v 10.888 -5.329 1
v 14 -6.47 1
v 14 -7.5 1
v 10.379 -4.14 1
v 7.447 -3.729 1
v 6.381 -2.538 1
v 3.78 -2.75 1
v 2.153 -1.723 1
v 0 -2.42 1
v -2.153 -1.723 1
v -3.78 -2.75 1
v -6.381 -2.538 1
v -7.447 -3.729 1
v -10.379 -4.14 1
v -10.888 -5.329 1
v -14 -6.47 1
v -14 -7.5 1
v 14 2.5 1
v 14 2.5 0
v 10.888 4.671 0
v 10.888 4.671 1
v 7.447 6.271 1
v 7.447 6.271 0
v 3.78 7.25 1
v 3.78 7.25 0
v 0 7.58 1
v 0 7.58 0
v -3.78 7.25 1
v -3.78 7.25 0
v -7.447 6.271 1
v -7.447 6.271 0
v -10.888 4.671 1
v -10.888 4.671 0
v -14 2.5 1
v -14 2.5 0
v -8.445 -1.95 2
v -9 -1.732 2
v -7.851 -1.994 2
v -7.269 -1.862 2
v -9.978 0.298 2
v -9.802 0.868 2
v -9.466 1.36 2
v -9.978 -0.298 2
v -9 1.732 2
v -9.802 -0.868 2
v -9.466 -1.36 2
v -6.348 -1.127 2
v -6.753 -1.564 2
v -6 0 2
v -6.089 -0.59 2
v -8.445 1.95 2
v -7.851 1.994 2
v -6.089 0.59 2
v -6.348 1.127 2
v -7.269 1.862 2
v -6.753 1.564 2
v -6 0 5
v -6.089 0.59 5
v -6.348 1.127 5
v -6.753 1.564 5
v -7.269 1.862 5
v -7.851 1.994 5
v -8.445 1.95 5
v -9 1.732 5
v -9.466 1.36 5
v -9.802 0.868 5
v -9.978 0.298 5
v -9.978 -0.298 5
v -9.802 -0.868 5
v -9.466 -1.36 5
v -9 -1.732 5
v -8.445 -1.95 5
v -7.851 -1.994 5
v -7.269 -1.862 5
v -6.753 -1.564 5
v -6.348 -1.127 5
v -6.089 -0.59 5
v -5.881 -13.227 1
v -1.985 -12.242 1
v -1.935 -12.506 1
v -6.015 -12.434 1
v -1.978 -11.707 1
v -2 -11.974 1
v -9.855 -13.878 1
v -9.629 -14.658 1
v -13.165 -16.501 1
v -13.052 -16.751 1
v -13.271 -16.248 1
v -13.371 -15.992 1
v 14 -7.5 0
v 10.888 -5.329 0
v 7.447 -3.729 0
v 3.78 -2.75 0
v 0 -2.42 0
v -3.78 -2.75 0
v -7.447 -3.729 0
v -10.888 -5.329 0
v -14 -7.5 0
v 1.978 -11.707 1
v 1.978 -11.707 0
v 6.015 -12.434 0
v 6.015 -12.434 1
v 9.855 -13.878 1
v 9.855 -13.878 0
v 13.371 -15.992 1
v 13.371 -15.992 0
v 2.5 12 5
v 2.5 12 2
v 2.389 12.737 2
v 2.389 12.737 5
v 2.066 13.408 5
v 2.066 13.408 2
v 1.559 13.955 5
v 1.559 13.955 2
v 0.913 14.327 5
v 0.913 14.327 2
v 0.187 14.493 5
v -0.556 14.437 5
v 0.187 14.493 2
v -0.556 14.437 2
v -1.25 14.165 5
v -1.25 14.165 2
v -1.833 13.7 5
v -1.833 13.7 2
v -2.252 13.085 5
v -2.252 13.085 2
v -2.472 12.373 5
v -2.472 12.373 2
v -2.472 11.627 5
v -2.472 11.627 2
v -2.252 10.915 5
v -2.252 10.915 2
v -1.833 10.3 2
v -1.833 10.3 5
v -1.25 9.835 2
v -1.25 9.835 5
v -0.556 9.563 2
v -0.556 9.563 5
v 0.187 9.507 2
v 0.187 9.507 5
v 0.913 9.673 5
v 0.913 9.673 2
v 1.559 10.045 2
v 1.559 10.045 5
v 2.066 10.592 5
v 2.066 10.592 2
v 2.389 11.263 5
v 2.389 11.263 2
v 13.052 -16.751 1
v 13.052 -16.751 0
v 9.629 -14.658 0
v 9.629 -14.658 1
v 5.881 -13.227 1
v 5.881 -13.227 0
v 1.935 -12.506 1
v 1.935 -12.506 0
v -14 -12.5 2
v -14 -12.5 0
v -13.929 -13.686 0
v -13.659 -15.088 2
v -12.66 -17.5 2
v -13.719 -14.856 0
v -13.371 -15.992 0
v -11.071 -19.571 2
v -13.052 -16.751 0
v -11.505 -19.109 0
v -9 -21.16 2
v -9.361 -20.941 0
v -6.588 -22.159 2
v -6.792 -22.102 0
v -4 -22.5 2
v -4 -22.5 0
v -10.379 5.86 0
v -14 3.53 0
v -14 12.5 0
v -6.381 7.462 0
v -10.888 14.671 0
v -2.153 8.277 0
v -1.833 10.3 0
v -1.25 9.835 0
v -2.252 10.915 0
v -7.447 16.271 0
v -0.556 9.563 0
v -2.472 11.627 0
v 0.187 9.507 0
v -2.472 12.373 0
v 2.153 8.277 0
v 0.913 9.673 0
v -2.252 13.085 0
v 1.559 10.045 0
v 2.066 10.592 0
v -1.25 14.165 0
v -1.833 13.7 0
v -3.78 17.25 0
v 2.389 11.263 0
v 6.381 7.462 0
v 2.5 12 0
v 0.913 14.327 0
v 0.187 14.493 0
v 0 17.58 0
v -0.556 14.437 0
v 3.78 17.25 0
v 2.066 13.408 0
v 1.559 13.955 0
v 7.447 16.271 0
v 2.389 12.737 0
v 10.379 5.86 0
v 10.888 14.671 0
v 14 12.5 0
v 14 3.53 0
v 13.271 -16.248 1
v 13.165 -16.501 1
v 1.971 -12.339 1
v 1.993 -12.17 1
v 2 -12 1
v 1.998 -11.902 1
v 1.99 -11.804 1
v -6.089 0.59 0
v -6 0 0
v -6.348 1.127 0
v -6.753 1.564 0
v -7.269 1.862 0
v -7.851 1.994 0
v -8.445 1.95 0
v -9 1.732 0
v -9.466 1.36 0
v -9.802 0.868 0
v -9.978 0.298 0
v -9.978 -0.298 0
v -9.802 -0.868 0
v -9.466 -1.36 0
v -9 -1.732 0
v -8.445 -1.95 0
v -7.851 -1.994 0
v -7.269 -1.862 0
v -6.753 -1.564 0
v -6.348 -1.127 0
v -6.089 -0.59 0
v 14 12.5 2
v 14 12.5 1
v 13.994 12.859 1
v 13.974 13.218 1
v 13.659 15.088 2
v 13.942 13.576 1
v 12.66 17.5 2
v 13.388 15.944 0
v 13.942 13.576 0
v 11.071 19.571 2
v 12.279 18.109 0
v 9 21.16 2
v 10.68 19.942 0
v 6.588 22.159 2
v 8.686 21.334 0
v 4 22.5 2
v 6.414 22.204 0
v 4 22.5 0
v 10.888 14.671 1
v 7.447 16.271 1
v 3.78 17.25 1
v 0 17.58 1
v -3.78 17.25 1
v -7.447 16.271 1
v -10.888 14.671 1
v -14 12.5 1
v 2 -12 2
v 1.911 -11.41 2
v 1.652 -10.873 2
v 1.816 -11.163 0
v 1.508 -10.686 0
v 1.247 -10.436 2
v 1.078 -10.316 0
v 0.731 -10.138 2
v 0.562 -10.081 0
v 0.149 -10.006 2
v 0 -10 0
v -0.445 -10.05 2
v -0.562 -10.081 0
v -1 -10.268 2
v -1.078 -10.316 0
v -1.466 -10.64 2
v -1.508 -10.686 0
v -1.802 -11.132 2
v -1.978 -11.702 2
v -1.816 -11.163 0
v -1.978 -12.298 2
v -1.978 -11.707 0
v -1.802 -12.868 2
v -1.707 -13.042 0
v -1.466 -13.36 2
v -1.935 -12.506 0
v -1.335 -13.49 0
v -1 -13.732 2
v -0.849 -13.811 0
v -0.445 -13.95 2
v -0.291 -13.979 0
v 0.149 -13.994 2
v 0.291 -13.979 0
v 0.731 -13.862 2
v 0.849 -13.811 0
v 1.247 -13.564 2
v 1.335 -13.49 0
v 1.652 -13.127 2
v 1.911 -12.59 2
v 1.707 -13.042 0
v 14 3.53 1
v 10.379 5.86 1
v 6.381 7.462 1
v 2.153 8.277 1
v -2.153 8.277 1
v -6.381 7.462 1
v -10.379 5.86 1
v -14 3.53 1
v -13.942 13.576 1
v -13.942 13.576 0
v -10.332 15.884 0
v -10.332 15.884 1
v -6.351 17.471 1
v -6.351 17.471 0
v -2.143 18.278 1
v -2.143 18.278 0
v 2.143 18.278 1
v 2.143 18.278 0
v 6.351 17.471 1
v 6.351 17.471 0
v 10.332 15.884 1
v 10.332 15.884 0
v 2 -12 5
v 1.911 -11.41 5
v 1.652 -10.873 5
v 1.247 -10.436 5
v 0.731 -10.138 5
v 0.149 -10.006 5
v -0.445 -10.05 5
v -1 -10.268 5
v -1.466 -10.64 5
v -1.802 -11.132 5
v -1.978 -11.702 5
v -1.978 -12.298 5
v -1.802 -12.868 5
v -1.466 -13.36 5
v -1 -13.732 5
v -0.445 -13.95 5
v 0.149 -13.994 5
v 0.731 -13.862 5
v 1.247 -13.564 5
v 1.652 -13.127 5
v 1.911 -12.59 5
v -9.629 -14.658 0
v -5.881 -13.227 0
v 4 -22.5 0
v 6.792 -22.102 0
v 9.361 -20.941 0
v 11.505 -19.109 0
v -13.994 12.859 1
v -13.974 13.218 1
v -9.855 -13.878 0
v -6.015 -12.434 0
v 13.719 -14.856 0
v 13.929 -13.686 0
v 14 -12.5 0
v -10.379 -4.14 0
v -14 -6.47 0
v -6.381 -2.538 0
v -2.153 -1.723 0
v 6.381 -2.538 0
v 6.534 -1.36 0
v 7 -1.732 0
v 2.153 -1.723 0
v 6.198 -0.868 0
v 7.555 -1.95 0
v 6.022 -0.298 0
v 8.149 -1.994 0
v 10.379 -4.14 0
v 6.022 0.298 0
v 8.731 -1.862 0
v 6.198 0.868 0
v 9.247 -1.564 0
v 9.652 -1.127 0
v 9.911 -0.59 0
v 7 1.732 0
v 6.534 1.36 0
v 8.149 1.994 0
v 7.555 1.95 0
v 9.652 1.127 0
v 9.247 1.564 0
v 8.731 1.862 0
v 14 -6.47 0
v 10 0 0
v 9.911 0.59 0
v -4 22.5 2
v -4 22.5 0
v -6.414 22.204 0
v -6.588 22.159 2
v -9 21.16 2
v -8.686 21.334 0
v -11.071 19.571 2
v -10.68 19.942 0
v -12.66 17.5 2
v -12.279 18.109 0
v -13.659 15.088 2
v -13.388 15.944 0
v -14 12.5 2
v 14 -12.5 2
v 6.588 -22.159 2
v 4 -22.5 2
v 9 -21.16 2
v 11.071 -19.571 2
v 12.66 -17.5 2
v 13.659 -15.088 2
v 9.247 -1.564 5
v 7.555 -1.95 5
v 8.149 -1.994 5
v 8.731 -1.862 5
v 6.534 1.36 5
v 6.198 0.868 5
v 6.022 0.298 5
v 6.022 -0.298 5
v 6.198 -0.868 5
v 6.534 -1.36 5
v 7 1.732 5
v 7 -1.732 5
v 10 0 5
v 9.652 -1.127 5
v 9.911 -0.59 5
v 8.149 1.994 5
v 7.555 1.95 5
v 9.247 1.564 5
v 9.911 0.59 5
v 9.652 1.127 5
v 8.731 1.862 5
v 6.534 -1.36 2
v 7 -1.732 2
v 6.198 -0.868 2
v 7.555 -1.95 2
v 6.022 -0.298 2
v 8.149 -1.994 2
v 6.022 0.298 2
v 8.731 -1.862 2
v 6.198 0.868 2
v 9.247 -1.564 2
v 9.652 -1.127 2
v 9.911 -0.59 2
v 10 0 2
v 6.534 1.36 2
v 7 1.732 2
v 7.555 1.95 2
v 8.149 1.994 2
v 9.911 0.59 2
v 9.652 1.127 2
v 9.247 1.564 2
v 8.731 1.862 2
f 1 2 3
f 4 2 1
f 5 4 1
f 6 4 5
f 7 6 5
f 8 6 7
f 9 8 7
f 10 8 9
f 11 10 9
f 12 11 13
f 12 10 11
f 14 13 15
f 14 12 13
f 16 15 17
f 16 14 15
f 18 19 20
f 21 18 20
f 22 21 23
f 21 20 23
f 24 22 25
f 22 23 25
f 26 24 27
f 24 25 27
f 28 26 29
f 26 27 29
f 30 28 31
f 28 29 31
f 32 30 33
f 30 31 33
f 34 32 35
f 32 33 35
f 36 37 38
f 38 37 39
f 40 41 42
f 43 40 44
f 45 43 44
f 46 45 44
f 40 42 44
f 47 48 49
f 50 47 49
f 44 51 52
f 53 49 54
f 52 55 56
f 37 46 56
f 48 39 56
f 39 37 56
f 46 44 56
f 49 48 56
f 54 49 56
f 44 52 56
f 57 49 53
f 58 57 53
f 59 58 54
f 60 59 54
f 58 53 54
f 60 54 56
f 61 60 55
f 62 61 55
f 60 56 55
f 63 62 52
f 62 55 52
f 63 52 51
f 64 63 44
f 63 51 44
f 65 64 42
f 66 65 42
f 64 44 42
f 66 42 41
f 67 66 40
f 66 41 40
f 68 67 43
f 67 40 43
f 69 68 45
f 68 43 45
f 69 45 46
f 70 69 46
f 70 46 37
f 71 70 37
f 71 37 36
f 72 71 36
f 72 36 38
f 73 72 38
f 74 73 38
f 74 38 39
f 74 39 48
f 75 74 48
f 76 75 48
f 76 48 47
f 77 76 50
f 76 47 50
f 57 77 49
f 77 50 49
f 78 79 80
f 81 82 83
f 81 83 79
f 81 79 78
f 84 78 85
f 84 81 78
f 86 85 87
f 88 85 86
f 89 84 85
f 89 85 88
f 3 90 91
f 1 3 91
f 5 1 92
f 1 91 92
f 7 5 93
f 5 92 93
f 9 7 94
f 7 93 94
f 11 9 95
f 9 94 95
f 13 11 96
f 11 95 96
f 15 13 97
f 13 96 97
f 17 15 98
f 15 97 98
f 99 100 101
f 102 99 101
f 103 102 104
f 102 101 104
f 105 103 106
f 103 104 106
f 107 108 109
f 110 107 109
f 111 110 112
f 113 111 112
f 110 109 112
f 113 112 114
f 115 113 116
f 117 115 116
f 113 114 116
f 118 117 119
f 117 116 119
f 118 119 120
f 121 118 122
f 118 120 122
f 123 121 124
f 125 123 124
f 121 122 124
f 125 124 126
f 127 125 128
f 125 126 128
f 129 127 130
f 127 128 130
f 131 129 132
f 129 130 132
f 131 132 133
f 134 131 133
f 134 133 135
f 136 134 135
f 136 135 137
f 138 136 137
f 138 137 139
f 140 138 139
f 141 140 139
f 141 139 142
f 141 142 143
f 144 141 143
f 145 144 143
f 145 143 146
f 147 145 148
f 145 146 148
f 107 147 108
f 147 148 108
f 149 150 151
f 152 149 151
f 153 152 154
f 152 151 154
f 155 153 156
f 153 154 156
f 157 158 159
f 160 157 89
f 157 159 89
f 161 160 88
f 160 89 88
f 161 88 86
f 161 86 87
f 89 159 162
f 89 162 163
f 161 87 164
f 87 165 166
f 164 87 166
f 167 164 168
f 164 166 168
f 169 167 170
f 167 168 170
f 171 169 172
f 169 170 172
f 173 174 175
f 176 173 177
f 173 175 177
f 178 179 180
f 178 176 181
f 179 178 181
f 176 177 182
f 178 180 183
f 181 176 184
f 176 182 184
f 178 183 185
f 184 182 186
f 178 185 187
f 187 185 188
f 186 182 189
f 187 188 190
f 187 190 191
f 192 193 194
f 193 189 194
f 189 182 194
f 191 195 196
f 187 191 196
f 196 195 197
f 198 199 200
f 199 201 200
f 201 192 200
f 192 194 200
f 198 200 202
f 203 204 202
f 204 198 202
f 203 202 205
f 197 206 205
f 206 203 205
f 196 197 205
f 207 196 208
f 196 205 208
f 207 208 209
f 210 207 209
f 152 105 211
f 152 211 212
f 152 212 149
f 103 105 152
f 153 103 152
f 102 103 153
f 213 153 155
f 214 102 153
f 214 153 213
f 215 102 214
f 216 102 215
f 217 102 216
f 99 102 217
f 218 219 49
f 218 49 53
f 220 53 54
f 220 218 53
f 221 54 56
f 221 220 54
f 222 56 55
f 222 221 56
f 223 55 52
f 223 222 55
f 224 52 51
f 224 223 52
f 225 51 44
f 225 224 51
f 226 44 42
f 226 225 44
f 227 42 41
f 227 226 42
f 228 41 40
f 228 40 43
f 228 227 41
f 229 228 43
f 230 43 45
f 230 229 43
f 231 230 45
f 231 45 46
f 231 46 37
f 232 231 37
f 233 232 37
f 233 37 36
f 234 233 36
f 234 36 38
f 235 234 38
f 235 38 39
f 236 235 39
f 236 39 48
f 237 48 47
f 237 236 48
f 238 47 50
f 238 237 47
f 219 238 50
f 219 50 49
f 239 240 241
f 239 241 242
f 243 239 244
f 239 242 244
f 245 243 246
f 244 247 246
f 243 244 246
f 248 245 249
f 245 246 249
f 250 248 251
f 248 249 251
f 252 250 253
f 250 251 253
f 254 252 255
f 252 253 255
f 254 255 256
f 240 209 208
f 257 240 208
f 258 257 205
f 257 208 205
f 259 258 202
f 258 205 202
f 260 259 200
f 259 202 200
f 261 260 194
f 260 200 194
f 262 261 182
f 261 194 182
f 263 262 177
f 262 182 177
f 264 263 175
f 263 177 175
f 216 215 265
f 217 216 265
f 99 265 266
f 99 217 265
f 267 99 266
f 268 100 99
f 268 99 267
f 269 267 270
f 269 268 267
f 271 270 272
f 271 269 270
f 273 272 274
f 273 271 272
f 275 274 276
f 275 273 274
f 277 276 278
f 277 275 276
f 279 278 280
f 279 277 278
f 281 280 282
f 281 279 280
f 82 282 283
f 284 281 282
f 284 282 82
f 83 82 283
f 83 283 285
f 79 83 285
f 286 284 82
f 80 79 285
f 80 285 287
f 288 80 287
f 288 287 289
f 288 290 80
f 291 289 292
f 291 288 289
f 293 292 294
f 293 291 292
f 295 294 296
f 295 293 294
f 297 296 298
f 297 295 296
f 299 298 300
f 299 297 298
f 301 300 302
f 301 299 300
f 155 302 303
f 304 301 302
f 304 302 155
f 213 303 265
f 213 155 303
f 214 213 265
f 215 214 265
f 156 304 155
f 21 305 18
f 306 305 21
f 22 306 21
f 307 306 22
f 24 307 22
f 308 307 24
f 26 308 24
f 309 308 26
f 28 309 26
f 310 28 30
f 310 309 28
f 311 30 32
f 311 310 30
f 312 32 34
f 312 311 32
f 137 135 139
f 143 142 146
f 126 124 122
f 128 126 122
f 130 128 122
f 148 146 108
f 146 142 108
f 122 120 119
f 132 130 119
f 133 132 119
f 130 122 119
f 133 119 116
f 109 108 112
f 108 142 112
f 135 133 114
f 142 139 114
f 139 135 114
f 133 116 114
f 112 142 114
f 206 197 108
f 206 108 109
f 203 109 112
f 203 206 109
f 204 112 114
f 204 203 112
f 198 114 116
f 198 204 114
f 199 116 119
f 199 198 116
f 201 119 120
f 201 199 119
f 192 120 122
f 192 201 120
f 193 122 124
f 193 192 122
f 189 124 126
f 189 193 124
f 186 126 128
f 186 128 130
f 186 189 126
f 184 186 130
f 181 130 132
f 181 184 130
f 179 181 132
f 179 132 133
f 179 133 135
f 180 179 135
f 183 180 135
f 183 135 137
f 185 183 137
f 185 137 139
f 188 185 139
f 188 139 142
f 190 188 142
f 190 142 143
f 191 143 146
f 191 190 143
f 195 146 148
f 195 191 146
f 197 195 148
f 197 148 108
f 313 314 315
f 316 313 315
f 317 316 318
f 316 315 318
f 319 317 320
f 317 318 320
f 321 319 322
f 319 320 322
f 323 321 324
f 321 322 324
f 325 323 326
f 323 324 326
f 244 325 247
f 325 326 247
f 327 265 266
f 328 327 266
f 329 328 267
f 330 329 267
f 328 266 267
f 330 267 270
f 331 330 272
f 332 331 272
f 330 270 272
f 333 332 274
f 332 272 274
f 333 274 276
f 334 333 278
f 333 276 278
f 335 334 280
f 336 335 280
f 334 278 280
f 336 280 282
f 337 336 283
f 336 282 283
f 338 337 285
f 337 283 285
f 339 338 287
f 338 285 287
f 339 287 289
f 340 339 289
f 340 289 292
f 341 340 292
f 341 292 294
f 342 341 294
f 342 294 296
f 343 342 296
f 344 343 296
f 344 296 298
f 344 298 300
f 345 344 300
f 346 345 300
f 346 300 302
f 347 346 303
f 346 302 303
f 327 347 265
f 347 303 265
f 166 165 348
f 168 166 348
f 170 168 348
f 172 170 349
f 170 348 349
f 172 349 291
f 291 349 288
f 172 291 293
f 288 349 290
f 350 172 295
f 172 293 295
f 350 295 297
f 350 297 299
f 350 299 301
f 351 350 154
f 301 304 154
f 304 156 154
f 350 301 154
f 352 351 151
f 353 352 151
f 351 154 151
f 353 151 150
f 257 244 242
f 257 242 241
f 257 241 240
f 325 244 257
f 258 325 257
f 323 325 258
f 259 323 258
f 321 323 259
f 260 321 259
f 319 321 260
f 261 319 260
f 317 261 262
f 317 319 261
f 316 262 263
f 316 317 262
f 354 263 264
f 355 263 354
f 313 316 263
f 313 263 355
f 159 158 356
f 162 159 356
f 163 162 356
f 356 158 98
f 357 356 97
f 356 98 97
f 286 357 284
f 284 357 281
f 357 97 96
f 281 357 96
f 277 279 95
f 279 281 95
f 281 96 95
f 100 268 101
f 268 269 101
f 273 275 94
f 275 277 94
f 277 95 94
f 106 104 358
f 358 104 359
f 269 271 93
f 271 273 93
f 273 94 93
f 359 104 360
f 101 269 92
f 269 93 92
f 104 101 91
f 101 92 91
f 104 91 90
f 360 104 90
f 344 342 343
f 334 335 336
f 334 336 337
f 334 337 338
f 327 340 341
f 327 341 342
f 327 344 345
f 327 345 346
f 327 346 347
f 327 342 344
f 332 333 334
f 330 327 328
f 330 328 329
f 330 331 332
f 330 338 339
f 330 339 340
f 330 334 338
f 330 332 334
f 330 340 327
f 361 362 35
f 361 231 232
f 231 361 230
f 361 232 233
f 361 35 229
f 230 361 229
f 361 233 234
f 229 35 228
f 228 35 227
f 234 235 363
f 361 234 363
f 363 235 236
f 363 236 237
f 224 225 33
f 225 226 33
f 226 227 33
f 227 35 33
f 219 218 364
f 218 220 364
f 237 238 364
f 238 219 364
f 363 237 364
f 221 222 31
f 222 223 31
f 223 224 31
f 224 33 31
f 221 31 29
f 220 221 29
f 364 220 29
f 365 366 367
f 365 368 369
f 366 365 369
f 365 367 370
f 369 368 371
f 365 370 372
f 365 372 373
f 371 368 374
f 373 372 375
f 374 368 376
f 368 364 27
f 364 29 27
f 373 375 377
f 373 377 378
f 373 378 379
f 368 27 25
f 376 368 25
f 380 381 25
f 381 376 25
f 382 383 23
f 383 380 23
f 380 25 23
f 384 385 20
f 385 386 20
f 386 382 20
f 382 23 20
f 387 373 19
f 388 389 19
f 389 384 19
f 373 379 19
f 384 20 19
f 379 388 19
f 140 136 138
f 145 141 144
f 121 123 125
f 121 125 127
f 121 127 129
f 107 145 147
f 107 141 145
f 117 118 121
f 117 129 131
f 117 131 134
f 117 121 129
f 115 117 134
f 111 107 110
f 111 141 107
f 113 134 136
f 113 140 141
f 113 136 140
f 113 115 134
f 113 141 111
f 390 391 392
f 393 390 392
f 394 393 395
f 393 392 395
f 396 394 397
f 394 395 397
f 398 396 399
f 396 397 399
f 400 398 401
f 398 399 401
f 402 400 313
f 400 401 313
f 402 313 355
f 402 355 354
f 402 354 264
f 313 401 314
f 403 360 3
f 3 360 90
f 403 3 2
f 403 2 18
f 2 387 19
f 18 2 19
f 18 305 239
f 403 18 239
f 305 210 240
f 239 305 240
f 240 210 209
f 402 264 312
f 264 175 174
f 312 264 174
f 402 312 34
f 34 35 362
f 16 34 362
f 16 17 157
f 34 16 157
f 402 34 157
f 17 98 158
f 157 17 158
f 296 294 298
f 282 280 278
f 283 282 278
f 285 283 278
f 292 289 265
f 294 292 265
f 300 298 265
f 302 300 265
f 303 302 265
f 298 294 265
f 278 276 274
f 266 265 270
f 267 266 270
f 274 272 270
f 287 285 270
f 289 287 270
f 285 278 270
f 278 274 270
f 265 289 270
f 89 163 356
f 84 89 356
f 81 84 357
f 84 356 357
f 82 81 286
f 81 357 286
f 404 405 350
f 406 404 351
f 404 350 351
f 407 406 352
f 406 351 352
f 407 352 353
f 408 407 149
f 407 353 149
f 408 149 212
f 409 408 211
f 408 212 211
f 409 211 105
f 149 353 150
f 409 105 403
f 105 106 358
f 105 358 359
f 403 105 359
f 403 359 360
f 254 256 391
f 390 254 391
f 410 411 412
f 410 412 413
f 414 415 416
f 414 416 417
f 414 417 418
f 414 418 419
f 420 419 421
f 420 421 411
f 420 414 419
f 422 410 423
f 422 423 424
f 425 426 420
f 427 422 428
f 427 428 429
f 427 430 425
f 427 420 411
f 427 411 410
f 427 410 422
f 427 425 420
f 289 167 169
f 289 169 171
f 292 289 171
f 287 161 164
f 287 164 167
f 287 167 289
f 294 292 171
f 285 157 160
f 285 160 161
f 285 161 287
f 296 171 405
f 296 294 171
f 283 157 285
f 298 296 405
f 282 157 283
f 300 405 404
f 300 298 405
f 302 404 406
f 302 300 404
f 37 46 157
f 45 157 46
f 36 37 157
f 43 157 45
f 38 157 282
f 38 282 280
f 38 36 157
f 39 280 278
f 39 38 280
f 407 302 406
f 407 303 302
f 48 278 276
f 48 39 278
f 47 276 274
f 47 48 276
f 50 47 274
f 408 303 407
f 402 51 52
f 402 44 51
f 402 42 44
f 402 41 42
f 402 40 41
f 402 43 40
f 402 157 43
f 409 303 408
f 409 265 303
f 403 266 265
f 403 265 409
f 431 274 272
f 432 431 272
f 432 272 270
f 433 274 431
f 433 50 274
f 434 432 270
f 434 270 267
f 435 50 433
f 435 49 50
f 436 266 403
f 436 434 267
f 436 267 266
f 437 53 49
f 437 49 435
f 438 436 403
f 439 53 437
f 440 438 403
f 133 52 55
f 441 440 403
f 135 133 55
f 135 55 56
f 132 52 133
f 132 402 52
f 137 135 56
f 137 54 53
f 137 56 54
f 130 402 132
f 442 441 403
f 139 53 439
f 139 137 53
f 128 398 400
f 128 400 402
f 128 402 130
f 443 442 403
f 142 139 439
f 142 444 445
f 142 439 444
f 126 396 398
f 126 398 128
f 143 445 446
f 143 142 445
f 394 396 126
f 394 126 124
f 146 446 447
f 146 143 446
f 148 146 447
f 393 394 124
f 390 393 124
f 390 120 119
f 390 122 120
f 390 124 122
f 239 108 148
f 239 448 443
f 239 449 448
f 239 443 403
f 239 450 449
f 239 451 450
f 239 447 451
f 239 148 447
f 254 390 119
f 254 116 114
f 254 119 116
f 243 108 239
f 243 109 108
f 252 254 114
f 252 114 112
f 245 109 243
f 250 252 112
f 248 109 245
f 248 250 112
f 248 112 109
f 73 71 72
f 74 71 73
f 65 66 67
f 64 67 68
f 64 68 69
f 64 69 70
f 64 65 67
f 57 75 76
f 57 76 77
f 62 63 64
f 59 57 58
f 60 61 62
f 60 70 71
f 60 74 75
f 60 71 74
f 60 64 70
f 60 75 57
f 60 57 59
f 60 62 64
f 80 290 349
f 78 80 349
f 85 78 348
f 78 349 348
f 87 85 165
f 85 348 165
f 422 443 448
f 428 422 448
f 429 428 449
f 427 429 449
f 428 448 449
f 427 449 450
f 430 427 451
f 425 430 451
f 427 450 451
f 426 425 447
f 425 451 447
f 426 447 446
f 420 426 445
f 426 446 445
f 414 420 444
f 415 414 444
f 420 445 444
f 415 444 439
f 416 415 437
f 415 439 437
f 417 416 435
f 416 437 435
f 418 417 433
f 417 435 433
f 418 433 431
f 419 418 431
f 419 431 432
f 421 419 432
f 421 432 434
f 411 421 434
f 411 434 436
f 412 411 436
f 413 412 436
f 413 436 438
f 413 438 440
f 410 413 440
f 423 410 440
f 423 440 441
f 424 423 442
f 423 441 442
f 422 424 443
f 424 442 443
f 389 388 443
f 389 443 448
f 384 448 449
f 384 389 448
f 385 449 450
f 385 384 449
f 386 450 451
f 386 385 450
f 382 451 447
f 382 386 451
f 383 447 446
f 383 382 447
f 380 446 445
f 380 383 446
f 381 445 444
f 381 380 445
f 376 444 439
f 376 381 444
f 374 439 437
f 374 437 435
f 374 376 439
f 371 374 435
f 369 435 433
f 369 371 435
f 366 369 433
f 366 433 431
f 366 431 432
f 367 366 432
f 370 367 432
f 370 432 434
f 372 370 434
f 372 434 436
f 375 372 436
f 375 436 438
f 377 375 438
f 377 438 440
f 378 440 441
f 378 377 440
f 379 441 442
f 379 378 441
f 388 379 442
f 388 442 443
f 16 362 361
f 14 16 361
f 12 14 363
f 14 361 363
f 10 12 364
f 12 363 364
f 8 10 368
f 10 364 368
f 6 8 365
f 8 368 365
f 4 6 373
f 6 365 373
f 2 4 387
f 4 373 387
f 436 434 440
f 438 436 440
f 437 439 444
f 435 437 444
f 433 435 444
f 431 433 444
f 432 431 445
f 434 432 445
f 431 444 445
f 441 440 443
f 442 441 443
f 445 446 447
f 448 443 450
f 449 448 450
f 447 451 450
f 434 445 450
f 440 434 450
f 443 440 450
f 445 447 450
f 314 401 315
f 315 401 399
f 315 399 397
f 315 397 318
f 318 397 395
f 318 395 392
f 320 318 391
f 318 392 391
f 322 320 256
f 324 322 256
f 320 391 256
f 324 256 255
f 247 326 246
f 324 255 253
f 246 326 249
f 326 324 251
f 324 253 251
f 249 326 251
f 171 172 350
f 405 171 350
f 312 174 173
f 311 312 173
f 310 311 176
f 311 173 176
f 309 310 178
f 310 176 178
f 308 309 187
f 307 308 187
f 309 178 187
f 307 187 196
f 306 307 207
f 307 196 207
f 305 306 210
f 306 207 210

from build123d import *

# Parameters (mm, degrees)
CROQUIS1_R                = 2.5
CROQUIS1_R_2              = 2
SALIENTE_EXTRUIR1_DEPTH   = 2
CROQUIS2_R                = 2
SALIENTE_EXTRUIR2_DEPTH   = 3
SALIENTE_EXTRUIR2_2_DEPTH = 3
SALIENTE_EXTRUIR2_3_DEPTH = 3
CROQUIS2_R_2              = 2.5
SALIENTE_EXTRUIR2_4_DEPTH = 3
CORTAR_EXTRUIR1_DEPTH     = 1


with BuildPart() as part:
    # Croquis1 → Saliente-Extruir1 (new body)
    with BuildSketch(Plane.XY):
        with BuildLine():
            Line((-4, -22.5), (4, -22.5))
            ThreePointArc((4, -22.5), (11.071067812, -19.571067812), (14, -12.5))
            Line((14, -12.5), (14, 12.5))
            ThreePointArc((14, 12.5), (11.071067812, 19.571067812), (4, 22.5))
            Line((4, 22.5), (-4, 22.5))
            ThreePointArc((-4, 22.5), (-11.071067812, 19.571067812), (-14, 12.5))
            Line((-14, 12.5), (-14, -12.5))
            ThreePointArc((-14, -12.5), (-11.071067812, -19.571067812), (-4, -22.5))
        make_face()
        with Locations((0, 12)):
            Circle(CROQUIS1_R, mode=Mode.SUBTRACT)
        with Locations((0, -12)):
            Circle(CROQUIS1_R_2, mode=Mode.SUBTRACT)
        with Locations((-8, 0)):
            Circle(CROQUIS1_R_2, mode=Mode.SUBTRACT)
        with Locations((8, 0)):
            Circle(CROQUIS1_R_2, mode=Mode.SUBTRACT)
    extrude(amount=SALIENTE_EXTRUIR1_DEPTH)

    # Croquis3 → Cortar-Extruir1 (cut)
    with BuildSketch(Plane(origin=(0, 0, 0), x_dir=(-1, 0, 0), z_dir=(0, 0, -1))):
        with BuildLine():
            ThreePointArc((-13.941990851, 13.575554705), (-13.985487182, 13.038558953), (-14, 12.5))
            ThreePointArc((-14, 12.5), (0, 17.579936281), (14, 12.5))
            ThreePointArc((14, 12.5), (13.985487182, 13.038558953), (13.941990851, 13.575554705))
            ThreePointArc((13.941990851, 13.575554705), (0, 18.379936281), (-13.941990851, 13.575554705))
        make_face()
        with BuildLine():
            Line((-14, 3.530035327), (-14, 2.5))
            ThreePointArc((-14, 2.5), (0, 7.579936281), (14, 2.5))
            Line((14, 2.5), (14, 3.530035327))
            ThreePointArc((14, 3.530035327), (0, 8.379936281), (-14, 3.530035327))
        make_face()
        with BuildLine():
            Line((-14, -6.469964673), (-14, -7.5))
            ThreePointArc((-14, -7.5), (0, -2.420063719), (14, -7.5))
            Line((14, -7.5), (14, -6.469964673))
            ThreePointArc((14, -6.469964673), (0, -1.620063719), (-14, -6.469964673))
        make_face()
        with BuildLine():
            ThreePointArc((-1.978377069, -11.706701226), (-7.967927856, -13.069093159), (-13.370512288, -15.991919166))
            ThreePointArc((-13.370512288, -15.991919166), (-13.218824107, -16.374697677), (-13.051507373, -16.750907464))
            ThreePointArc((-13.051507373, -16.750907464), (-7.788018836, -13.856434527), (-1.934937817, -12.505979886))
            ThreePointArc((-1.934937817, -12.505979886), (-1.997052815, -12.108535966), (-1.978377069, -11.706701226))
        make_face()
        with BuildLine():
            ThreePointArc((13.370512288, -15.991919166), (7.967927856, -13.069093159), (1.978377069, -11.706701226))
            ThreePointArc((1.978377069, -11.706701226), (1.997052815, -12.108535966), (1.934937817, -12.505979886))
            ThreePointArc((1.934937817, -12.505979886), (7.788018836, -13.856434527), (13.051507373, -16.750907464))
            ThreePointArc((13.051507373, -16.750907464), (13.218824107, -16.374697677), (13.370512288, -15.991919166))
        make_face()
    extrude(amount=-CORTAR_EXTRUIR1_DEPTH, mode=Mode.SUBTRACT)


with BuildPart() as body_2:
    # Croquis2 → Saliente-Extruir2 (new body)
    with BuildSketch(Plane.XY.offset(2)):
        with Locations((8, 0)):
            Circle(CROQUIS2_R)
    extrude(amount=SALIENTE_EXTRUIR2_DEPTH)


with BuildPart() as body_3:
    # Croquis2 → Saliente-Extruir2 2 (new body)
    with BuildSketch(Plane.XY.offset(2)):
        with Locations((0, -12)):
            Circle(CROQUIS2_R)
    extrude(amount=SALIENTE_EXTRUIR2_2_DEPTH)


with BuildPart() as body_4:
    # Croquis2 → Saliente-Extruir2 3 (new body)
    with BuildSketch(Plane.XY.offset(2)):
        with Locations((-8, 0)):
            Circle(CROQUIS2_R)
    extrude(amount=SALIENTE_EXTRUIR2_3_DEPTH)


with BuildPart() as body_5:
    # Croquis2 → Saliente-Extruir2 4 (new body)
    with BuildSketch(Plane.XY.offset(2)):
        with Locations((0, 12)):
            Circle(CROQUIS2_R_2)
    extrude(amount=SALIENTE_EXTRUIR2_4_DEPTH)


solid = Compound([part.part, body_2.part, body_3.part, body_4.part, body_5.part])
